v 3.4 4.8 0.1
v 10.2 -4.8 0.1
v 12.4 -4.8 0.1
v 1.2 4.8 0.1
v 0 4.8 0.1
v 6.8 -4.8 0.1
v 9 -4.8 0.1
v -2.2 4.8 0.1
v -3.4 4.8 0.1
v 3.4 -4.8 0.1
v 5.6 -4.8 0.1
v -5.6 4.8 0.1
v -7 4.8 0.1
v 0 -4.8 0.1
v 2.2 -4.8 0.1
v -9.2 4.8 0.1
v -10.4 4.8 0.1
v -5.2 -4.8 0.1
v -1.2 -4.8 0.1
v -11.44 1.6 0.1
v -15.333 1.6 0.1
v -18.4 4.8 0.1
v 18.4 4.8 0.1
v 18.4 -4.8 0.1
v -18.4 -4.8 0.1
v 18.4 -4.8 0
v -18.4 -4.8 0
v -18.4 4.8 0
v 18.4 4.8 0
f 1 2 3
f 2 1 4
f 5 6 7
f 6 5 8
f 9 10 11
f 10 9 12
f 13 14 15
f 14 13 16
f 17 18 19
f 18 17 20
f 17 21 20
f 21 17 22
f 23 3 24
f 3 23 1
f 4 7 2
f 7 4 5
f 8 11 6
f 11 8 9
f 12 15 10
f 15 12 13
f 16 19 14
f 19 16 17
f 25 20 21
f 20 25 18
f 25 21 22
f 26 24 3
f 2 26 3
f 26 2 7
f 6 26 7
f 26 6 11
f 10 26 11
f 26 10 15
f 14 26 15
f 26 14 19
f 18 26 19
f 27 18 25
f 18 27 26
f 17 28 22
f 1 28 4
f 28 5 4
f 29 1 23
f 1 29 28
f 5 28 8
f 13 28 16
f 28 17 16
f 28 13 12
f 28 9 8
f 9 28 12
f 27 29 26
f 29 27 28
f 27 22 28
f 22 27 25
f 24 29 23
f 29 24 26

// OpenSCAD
// file: ../p/box3u12.scad
use <../lib.scad>
function ldraw_lib__box3u12() = [
// 0 Box with 3 Parallel Faces without Any Edges
// 0 Name: box3u12.dat
// 0 Author: J.C. Tchang [tchang]
// 0 !LDRAW_ORG Primitive UPDATE 2014-02
// 0 !LICENSE Licensed under CC BY 2.0 and CC BY 4.0 : see CAreadme.txt
// 
// 0 BFC CERTIFY CCW
  [0,"BFC","CERTIFY"],
  [0,"BFC","CCW"],
// 
// 0 !HISTORY 2014-12-23 [PTadmin] Official Update 2014-02
// 
// 
// 4 16 -1 1 1 1 1 1 1 1 -1 -1 1 -1
  [4,16,-1,1,1,1,1,1,1,1,-1,-1,1,-1],
// 4 16 -1 1 1 -1 0 1 1 0 1 1 1 1
  [4,16,-1,1,1,-1,0,1,1,0,1,1,1,1],
// 4 16 1 1 -1 1 0 -1 -1 0 -1 -1 1 -1
  [4,16,1,1,-1,1,0,-1,-1,0,-1,-1,1,-1],
];
makepoly(ldraw_lib__box3u12(), line=0.2);
// file: 197905c.scad
use <../lib.scad>
use <../p/box3u12.scad>
function ldraw_lib__197905c() = [
// 0 Sticker  4.6 x  1.2 with Black Diagonal Stripes (Right)
// 0 Name: 197905c.dat
// 0 Author: Damien Roux [Darats]
// 0 !LDRAW_ORG Part UPDATE 2014-02
// 0 !LICENSE Licensed under CC BY 2.0 and CC BY 4.0 : see CAreadme.txt
// 
// 0 BFC CERTIFY CCW
  [0,"BFC","CERTIFY"],
  [0,"BFC","CCW"],
// 
// 0 !KEYWORDS Set 5510
// 
// 0 !HISTORY 2014-12-23 [PTadmin] Official Update 2014-02
// 
// 
// 4 0 -31 -0.25 -12 -25.5 -0.25 -12 -3 -0.25 12 -8.5 -0.25 12
  [4,0,-31,-0.25,-12,-25.5,-0.25,-12,-3,-0.25,12,-8.5,-0.25,12],
// 4 0 -22.5 -0.25 -12 -17 -0.25 -12 5.5 -0.25 12 0 -0.25 12
  [4,0,-22.5,-0.25,-12,-17,-0.25,-12,5.5,-0.25,12,0,-0.25,12],
// 4 0 -14 -0.25 -12 -8.5 -0.25 -12 14 -0.25 12 8.5 -0.25 12
  [4,0,-14,-0.25,-12,-8.5,-0.25,-12,14,-0.25,12,8.5,-0.25,12],
// 4 0 -5.5 -0.25 -12 0 -0.25 -12 23 -0.25 12 17.5 -0.25 12
  [4,0,-5.5,-0.25,-12,0,-0.25,-12,23,-0.25,12,17.5,-0.25,12],
// 4 0 26 -0.25 12 3 -0.25 -12 13 -0.25 -12 28.6 -0.25 4
  [4,0,26,-0.25,12,3,-0.25,-12,13,-0.25,-12,28.6,-0.25,4],
// 4 0 46 -0.25 12 26 -0.25 12 28.6 -0.25 4 38.333 -0.25 4
  [4,0,46,-0.25,12,26,-0.25,12,28.6,-0.25,4,38.333,-0.25,4],
// 4 16 -46 -0.25 -12 -31 -0.25 -12 -8.5 -0.25 12 -46 -0.25 12
  [4,16,-46,-0.25,-12,-31,-0.25,-12,-8.5,-0.25,12,-46,-0.25,12],
// 4 16 -25.5 -0.25 -12 -22.5 -0.25 -12 0 -0.25 12 -3 -0.25 12
  [4,16,-25.5,-0.25,-12,-22.5,-0.25,-12,0,-0.25,12,-3,-0.25,12],
// 4 16 -17 -0.25 -12 -14 -0.25 -12 8.5 -0.25 12 5.5 -0.25 12
  [4,16,-17,-0.25,-12,-14,-0.25,-12,8.5,-0.25,12,5.5,-0.25,12],
// 4 16 -8.5 -0.25 -12 -5.5 -0.25 -12 17.5 -0.25 12 14 -0.25 12
  [4,16,-8.5,-0.25,-12,-5.5,-0.25,-12,17.5,-0.25,12,14,-0.25,12],
// 4 16 0 -0.25 -12 3 -0.25 -12 26 -0.25 12 23 -0.25 12
  [4,16,0,-0.25,-12,3,-0.25,-12,26,-0.25,12,23,-0.25,12],
// 4 16 46 -0.25 -12 38.333 -0.25 4 28.6 -0.25 4 13 -0.25 -12
  [4,16,46,-0.25,-12,38.333,-0.25,4,28.6,-0.25,4,13,-0.25,-12],
// 3 16 46 -0.25 12 38.333 -0.25 4 46 -0.25 -12
  [3,16,46,-0.25,12,38.333,-0.25,4,46,-0.25,-12],
// 
// 3 16 -31 -0.25 -12 -46 -0.25 -12 -46 0 -12
  [3,16,-31,-0.25,-12,-46,-0.25,-12,-46,0,-12],
// 3 16 -31 -0.25 -12 -46 0 -12 -25.5 -0.25 -12
  [3,16,-31,-0.25,-12,-46,0,-12,-25.5,-0.25,-12],
// 3 16 -22.5 -0.25 -12 -25.5 -0.25 -12 -46 0 -12
  [3,16,-22.5,-0.25,-12,-25.5,-0.25,-12,-46,0,-12],
// 3 16 -22.5 -0.25 -12 -46 0 -12 -17 -0.25 -12
  [3,16,-22.5,-0.25,-12,-46,0,-12,-17,-0.25,-12],
// 3 16 -14 -0.25 -12 -17 -0.25 -12 -46 0 -12
  [3,16,-14,-0.25,-12,-17,-0.25,-12,-46,0,-12],
// 3 16 -14 -0.25 -12 -46 0 -12 -8.5 -0.25 -12
  [3,16,-14,-0.25,-12,-46,0,-12,-8.5,-0.25,-12],
// 3 16 -5.5 -0.25 -12 -8.5 -0.25 -12 -46 0 -12
  [3,16,-5.5,-0.25,-12,-8.5,-0.25,-12,-46,0,-12],
// 3 16 -5.5 -0.25 -12 -46 0 -12 0 -0.25 -12
  [3,16,-5.5,-0.25,-12,-46,0,-12,0,-0.25,-12],
// 3 16 3 -0.25 -12 0 -0.25 -12 -46 0 -12
  [3,16,3,-0.25,-12,0,-0.25,-12,-46,0,-12],
// 3 16 3 -0.25 -12 -46 0 -12 13 -0.25 -12
  [3,16,3,-0.25,-12,-46,0,-12,13,-0.25,-12],
// 4 16 13 -0.25 -12 -46 0 -12 46 0 -12 46 -0.25 -12
  [4,16,13,-0.25,-12,-46,0,-12,46,0,-12,46,-0.25,-12],
// 3 16 46 -0.25 12 46 0 12 26 -0.25 12
  [3,16,46,-0.25,12,46,0,12,26,-0.25,12],
// 3 16 -3 -0.25 12 46 0 12 -8.5 -0.25 12
  [3,16,-3,-0.25,12,46,0,12,-8.5,-0.25,12],
// 3 16 -3 -0.25 12 0 -0.25 12 46 0 12
  [3,16,-3,-0.25,12,0,-0.25,12,46,0,12],
// 4 16 -8.5 -0.25 12 46 0 12 -46 0 12 -46 -0.25 12
  [4,16,-8.5,-0.25,12,46,0,12,-46,0,12,-46,-0.25,12],
// 3 16 5.5 -0.25 12 46 0 12 0 -0.25 12
  [3,16,5.5,-0.25,12,46,0,12,0,-0.25,12],
// 3 16 23 -0.25 12 46 0 12 17.5 -0.25 12
  [3,16,23,-0.25,12,46,0,12,17.5,-0.25,12],
// 3 16 23 -0.25 12 26 -0.25 12 46 0 12
  [3,16,23,-0.25,12,26,-0.25,12,46,0,12],
// 3 16 14 -0.25 12 17.5 -0.25 12 46 0 12
  [3,16,14,-0.25,12,17.5,-0.25,12,46,0,12],
// 3 16 5.5 -0.25 12 8.5 -0.25 12 46 0 12
  [3,16,5.5,-0.25,12,8.5,-0.25,12,46,0,12],
// 3 16 14 -0.25 12 46 0 12 8.5 -0.25 12
  [3,16,14,-0.25,12,46,0,12,8.5,-0.25,12],
// 1 16 0 -0.25 0 0 0 46 0 0.25 0 -12 0 0 box3u12.dat
  [1,16,0,-0.25,0,0,0,46,0,0.25,0,-12,0,0, ldraw_lib__box3u12()],
];
makepoly(ldraw_lib__197905c(), line=0.2);
// main file
use <../lib.scad>
use <197905c.scad>
function ldraw_lib__197905d() = [
// 0 Sticker  4.6 x  1.2 with Black Diagonal Stripes (Left)
// 0 Name: 197905d.dat
// 0 Author: Damien Roux [Darats]
// 0 !LDRAW_ORG Part UPDATE 2014-02
// 0 !LICENSE Licensed under CC BY 2.0 and CC BY 4.0 : see CAreadme.txt
// 
// 0 BFC CERTIFY CCW
  [0,"BFC","CERTIFY"],
  [0,"BFC","CCW"],
// 
// 0 !KEYWORDS Set 5510
// 
// 0 !HISTORY 2014-12-23 [PTadmin] Official Update 2014-02
// 
// 
// 1 16 0 0 0 -1 0 0 0 1 0 0 0 1 197905c.dat
  [1,16,0,0,0,-1,0,0,0,1,0,0,0,1, ldraw_lib__197905c()],
];
makepoly(ldraw_lib__197905d(), line=0.2);
